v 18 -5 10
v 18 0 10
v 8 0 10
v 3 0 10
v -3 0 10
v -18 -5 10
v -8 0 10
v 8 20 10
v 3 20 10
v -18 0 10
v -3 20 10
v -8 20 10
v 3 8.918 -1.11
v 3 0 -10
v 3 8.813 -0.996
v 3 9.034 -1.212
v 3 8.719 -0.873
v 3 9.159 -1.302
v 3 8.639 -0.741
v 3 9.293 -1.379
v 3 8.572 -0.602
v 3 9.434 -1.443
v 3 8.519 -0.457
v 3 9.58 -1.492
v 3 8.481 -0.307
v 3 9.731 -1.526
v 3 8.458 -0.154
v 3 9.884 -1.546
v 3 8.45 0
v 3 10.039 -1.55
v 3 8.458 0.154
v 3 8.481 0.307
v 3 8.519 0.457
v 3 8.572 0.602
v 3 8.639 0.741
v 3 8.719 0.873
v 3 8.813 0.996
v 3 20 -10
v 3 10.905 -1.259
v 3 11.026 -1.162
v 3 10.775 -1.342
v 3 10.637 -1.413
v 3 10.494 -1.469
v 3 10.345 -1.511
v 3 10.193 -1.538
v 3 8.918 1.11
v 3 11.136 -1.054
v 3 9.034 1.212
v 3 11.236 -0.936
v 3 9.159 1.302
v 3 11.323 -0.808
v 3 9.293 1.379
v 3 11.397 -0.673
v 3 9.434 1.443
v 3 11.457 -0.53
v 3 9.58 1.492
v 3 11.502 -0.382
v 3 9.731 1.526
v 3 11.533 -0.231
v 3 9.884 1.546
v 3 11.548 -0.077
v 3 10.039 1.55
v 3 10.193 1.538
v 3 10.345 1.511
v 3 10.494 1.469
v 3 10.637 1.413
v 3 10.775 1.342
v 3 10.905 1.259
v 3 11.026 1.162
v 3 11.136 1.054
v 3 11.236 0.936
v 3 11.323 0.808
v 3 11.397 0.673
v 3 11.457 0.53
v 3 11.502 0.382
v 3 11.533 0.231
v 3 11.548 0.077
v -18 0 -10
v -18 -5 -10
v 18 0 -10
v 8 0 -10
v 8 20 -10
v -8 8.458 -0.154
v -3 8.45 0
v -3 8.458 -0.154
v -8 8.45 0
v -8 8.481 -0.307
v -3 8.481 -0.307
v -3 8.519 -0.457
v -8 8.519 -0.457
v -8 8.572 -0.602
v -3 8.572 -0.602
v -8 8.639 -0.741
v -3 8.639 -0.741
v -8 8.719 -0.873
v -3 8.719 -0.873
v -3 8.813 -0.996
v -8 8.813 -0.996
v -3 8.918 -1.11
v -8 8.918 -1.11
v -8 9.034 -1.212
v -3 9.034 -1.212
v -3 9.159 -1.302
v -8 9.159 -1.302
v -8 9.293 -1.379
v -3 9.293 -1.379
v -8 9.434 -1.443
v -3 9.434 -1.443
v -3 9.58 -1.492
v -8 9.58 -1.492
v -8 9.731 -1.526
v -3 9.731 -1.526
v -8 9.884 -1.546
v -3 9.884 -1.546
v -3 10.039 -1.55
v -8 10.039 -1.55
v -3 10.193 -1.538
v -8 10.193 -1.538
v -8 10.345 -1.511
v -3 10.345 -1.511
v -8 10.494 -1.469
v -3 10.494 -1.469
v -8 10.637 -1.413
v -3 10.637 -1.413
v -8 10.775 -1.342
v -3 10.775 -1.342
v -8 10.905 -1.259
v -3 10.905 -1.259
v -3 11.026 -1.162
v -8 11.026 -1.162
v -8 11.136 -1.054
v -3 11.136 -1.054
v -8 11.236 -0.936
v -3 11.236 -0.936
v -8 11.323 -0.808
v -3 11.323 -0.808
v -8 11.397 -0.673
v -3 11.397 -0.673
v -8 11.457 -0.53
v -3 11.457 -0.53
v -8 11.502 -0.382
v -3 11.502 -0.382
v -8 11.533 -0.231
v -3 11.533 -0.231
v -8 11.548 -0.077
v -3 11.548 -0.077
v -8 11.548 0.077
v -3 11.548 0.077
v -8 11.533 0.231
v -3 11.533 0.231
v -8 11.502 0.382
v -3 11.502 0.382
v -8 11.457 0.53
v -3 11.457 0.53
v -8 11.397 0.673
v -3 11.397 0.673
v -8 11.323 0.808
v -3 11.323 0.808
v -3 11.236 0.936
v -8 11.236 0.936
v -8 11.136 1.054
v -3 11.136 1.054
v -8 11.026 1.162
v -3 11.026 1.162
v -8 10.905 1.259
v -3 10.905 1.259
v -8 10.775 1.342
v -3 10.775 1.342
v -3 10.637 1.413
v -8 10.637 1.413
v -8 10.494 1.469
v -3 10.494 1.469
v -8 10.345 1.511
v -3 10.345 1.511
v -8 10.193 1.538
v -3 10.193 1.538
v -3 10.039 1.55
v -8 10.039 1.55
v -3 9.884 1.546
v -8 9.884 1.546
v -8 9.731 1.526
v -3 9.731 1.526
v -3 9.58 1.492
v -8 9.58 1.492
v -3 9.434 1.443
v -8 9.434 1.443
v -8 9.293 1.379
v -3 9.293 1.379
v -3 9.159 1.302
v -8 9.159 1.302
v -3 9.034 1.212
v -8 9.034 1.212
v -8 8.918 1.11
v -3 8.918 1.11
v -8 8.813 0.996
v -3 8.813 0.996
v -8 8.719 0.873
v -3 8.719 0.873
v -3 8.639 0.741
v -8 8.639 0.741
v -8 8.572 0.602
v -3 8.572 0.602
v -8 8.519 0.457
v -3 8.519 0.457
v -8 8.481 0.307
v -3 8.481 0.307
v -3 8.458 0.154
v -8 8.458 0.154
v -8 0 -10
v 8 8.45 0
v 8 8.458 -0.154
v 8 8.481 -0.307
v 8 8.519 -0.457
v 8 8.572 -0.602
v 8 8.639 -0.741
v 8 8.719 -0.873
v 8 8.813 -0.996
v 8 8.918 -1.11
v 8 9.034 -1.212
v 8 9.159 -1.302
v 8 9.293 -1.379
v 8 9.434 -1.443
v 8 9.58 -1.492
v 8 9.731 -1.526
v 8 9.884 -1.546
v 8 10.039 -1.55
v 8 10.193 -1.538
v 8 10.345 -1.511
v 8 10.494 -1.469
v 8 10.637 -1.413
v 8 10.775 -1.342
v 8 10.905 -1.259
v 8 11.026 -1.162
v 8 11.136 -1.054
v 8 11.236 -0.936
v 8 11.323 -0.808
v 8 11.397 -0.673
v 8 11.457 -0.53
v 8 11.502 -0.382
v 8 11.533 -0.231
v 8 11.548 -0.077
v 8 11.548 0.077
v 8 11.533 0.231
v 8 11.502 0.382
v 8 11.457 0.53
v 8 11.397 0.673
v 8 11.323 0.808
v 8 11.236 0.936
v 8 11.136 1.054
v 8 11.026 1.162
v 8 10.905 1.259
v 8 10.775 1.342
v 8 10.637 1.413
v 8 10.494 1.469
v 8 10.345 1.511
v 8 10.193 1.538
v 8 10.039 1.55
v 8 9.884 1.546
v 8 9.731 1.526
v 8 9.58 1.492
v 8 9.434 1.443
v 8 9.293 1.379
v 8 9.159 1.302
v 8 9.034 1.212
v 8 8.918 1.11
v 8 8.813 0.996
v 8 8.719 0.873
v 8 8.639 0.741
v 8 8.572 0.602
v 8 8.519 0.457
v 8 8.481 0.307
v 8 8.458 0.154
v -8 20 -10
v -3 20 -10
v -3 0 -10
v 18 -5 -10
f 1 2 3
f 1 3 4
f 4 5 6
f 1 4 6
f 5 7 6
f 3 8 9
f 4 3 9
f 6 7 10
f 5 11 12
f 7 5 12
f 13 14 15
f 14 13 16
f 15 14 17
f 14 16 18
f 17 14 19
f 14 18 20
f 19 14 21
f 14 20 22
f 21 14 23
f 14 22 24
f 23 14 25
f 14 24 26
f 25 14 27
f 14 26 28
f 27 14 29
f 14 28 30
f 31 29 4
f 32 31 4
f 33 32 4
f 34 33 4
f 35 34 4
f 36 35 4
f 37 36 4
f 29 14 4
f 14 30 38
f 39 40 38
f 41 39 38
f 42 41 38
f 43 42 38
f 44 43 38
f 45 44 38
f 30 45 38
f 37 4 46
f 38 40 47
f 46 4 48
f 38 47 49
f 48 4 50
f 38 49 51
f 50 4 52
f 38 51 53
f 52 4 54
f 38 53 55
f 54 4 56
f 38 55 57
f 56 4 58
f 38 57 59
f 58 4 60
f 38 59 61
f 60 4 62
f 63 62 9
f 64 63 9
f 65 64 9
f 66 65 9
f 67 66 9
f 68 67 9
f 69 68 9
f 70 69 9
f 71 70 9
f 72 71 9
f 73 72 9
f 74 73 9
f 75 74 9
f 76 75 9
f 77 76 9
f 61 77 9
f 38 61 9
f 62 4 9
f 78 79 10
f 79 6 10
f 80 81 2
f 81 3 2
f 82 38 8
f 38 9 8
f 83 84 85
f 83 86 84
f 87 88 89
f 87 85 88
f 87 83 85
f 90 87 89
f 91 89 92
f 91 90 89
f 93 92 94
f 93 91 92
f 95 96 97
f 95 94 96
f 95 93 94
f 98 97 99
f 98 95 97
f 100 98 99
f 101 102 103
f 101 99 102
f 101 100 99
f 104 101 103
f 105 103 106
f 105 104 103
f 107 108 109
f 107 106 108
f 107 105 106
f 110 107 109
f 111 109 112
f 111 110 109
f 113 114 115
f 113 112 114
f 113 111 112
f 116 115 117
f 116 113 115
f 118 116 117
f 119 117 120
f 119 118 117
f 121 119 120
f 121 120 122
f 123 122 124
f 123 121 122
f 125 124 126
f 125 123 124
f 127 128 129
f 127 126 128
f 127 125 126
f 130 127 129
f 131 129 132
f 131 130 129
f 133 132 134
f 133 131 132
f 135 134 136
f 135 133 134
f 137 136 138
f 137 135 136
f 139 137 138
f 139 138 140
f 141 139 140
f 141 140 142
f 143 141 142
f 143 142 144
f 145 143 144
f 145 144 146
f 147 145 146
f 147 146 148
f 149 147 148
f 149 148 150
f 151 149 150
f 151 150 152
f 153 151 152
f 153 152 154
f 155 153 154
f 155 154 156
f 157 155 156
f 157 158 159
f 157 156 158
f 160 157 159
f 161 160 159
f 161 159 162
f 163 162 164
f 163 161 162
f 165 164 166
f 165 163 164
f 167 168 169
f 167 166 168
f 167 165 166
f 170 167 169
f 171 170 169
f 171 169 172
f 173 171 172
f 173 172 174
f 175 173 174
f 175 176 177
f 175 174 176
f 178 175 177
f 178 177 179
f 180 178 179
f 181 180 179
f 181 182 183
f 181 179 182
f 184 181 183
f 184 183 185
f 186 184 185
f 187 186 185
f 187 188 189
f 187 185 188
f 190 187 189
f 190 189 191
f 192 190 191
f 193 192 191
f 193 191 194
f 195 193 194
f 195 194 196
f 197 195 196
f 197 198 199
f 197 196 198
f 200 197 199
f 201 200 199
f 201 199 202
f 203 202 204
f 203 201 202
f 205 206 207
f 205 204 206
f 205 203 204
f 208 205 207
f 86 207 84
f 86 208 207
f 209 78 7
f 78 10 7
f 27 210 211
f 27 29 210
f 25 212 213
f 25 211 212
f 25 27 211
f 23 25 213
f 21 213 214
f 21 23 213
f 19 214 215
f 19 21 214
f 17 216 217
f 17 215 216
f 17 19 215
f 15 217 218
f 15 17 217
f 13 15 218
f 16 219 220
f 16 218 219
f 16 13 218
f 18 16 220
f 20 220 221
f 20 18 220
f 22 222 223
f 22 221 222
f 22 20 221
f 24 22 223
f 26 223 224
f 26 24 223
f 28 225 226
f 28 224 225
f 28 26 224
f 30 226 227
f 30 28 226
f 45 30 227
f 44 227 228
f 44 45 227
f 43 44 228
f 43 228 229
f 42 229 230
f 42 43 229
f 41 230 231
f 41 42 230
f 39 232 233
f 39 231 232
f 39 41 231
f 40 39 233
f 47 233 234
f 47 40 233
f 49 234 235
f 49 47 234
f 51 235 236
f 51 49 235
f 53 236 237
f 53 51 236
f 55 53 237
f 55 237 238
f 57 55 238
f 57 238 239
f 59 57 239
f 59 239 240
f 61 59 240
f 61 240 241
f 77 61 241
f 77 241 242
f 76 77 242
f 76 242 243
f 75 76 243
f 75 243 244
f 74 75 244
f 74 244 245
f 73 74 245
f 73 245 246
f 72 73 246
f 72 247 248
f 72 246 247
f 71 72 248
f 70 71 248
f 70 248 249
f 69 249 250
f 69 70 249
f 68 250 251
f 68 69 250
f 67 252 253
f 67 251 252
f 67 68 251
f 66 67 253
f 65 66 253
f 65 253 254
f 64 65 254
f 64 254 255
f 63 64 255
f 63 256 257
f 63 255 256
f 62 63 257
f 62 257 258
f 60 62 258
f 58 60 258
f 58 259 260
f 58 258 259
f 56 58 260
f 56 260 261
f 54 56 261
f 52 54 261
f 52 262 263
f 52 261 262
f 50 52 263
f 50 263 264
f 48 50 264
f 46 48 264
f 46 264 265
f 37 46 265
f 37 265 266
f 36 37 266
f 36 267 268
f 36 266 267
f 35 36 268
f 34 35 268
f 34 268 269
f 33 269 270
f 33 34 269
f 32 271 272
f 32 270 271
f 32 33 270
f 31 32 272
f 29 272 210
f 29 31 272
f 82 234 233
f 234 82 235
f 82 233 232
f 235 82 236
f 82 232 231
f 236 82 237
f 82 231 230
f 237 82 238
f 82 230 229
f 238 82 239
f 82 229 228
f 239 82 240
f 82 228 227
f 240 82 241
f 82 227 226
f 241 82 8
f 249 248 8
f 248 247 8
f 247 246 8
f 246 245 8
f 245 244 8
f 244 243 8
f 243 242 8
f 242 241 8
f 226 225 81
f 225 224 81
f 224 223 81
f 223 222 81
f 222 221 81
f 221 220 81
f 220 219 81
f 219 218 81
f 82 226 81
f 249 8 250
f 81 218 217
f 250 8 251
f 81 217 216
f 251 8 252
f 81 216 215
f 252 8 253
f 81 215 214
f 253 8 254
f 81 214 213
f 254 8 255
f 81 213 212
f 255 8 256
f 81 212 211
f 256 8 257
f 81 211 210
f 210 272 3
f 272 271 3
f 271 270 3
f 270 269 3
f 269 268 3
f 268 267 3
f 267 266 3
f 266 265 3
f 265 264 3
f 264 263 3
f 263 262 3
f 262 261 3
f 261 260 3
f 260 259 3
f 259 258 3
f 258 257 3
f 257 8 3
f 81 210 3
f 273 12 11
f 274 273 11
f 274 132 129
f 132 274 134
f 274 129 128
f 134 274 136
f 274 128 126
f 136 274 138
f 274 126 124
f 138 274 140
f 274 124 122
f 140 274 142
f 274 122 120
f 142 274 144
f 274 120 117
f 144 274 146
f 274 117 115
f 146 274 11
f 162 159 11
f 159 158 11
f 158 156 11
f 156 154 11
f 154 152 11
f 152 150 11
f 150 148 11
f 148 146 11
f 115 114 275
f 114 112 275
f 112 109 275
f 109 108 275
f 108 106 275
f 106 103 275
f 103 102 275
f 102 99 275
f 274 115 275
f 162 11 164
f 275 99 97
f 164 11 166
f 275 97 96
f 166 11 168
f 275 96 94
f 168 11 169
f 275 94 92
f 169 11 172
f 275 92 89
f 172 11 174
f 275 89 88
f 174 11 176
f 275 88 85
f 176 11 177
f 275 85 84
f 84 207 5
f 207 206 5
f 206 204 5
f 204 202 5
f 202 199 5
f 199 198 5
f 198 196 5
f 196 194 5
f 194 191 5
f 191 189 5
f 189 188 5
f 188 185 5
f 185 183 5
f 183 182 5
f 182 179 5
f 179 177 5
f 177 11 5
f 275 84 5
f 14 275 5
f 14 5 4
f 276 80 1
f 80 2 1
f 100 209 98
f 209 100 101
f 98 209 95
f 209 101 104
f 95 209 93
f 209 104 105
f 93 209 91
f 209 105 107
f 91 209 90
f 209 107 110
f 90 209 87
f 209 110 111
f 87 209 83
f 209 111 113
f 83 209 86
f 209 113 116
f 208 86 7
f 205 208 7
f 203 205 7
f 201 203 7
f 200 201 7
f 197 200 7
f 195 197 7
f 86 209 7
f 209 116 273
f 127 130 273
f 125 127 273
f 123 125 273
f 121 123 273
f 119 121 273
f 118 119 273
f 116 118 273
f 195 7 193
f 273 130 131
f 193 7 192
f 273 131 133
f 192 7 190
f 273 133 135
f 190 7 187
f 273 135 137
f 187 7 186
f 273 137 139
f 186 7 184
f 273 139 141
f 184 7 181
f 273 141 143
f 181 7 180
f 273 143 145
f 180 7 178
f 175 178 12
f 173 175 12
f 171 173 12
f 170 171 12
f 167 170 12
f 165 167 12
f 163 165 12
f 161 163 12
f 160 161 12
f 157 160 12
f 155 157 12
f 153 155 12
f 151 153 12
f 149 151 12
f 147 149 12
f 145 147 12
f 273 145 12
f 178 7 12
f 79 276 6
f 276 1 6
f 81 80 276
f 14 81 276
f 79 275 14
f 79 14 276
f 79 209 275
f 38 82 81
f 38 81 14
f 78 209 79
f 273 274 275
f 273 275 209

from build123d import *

# Parameters (mm, degrees)
BOSS_EXTRUDE1_DEPTH     = 10
CUT_EXTRUDE1_DEPTH      = 29.705400189
CUT_EXTRUDE1_DEPTH_BACK = 29.705400189
SKETCH2_R               = 1.55


with BuildPart() as part:
    # Sketch1 → Boss-Extrude1 (new, symmetric)
    with BuildSketch(Plane.XY):
        Polygon((-3, 20), (-3, 0), (3, 0), (3, 20), (8, 20), (8, 0), (18, 0), (18, -5), (-18, -5), (-18, 0), (-8, 0), (-8, 20), align=None)
    extrude(amount=BOSS_EXTRUDE1_DEPTH, both=True)

    # Sketch2 → Cut-Extrude1 (cut, two sides: drawn at the far end of the back side and taken through both)
    with BuildSketch(Plane(origin=(0, 0, 0), x_dir=(0, 0, -1), z_dir=(1, 0, 0)).offset(-CUT_EXTRUDE1_DEPTH_BACK)):
        with Locations(Location((0, 10, 0), (0, 0, 270))):
            Circle(SKETCH2_R)
    extrude(amount=CUT_EXTRUDE1_DEPTH + CUT_EXTRUDE1_DEPTH_BACK, mode=Mode.SUBTRACT)


solid = part.part
